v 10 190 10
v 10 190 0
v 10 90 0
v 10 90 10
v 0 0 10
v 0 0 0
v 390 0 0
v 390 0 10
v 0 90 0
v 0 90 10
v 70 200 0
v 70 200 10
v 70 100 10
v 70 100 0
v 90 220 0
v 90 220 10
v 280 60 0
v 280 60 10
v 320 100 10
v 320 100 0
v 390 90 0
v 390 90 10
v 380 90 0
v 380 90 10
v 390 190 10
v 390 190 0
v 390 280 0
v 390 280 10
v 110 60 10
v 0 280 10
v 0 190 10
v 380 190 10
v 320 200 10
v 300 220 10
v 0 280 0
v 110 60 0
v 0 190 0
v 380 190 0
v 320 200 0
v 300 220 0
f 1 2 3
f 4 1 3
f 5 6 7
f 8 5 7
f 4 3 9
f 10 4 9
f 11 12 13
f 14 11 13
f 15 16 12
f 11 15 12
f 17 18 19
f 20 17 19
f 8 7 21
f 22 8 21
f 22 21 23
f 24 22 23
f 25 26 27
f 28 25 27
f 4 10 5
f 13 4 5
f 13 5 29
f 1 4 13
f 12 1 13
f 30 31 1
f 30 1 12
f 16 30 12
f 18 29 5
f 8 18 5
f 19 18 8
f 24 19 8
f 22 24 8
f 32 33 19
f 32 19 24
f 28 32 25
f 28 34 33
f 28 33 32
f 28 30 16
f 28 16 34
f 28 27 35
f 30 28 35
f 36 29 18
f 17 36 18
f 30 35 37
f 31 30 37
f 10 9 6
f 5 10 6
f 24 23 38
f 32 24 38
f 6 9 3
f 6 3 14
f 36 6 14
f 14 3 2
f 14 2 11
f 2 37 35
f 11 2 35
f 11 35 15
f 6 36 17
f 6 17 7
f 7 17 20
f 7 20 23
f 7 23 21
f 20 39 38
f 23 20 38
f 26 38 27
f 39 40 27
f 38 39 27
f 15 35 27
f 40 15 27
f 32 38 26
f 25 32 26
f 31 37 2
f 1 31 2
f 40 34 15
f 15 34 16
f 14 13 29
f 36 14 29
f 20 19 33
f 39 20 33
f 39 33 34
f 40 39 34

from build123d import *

# Parameters (mm, degrees)
BOSS_EXTRU_2_DEPTH      = 10
ENL_V_MAT_EXTRU_1_DEPTH = 10


with BuildPart() as part:
    # Esquisse1 → Boss.-Extru.2 (new body)
    with BuildSketch(Plane.XY):
        Polygon((0, 0), (390, 0), (390, 90), (380, 90), (380, 190), (390, 190), (390, 280), (0, 280), (0, 190), (10, 190), (10, 90), (0, 90), align=None)
    extrude(amount=BOSS_EXTRU_2_DEPTH)

    # Esquisse3 → Enlèv. mat.-Extru.1 (cut)
    with BuildSketch(Plane.XY.offset(10)):
        Polygon((70, 100), (110, 60), (280, 60), (320, 100), (320, 200), (300, 220), (90, 220), (70, 200), align=None)
    extrude(amount=-ENL_V_MAT_EXTRU_1_DEPTH, mode=Mode.SUBTRACT)


solid = part.part
